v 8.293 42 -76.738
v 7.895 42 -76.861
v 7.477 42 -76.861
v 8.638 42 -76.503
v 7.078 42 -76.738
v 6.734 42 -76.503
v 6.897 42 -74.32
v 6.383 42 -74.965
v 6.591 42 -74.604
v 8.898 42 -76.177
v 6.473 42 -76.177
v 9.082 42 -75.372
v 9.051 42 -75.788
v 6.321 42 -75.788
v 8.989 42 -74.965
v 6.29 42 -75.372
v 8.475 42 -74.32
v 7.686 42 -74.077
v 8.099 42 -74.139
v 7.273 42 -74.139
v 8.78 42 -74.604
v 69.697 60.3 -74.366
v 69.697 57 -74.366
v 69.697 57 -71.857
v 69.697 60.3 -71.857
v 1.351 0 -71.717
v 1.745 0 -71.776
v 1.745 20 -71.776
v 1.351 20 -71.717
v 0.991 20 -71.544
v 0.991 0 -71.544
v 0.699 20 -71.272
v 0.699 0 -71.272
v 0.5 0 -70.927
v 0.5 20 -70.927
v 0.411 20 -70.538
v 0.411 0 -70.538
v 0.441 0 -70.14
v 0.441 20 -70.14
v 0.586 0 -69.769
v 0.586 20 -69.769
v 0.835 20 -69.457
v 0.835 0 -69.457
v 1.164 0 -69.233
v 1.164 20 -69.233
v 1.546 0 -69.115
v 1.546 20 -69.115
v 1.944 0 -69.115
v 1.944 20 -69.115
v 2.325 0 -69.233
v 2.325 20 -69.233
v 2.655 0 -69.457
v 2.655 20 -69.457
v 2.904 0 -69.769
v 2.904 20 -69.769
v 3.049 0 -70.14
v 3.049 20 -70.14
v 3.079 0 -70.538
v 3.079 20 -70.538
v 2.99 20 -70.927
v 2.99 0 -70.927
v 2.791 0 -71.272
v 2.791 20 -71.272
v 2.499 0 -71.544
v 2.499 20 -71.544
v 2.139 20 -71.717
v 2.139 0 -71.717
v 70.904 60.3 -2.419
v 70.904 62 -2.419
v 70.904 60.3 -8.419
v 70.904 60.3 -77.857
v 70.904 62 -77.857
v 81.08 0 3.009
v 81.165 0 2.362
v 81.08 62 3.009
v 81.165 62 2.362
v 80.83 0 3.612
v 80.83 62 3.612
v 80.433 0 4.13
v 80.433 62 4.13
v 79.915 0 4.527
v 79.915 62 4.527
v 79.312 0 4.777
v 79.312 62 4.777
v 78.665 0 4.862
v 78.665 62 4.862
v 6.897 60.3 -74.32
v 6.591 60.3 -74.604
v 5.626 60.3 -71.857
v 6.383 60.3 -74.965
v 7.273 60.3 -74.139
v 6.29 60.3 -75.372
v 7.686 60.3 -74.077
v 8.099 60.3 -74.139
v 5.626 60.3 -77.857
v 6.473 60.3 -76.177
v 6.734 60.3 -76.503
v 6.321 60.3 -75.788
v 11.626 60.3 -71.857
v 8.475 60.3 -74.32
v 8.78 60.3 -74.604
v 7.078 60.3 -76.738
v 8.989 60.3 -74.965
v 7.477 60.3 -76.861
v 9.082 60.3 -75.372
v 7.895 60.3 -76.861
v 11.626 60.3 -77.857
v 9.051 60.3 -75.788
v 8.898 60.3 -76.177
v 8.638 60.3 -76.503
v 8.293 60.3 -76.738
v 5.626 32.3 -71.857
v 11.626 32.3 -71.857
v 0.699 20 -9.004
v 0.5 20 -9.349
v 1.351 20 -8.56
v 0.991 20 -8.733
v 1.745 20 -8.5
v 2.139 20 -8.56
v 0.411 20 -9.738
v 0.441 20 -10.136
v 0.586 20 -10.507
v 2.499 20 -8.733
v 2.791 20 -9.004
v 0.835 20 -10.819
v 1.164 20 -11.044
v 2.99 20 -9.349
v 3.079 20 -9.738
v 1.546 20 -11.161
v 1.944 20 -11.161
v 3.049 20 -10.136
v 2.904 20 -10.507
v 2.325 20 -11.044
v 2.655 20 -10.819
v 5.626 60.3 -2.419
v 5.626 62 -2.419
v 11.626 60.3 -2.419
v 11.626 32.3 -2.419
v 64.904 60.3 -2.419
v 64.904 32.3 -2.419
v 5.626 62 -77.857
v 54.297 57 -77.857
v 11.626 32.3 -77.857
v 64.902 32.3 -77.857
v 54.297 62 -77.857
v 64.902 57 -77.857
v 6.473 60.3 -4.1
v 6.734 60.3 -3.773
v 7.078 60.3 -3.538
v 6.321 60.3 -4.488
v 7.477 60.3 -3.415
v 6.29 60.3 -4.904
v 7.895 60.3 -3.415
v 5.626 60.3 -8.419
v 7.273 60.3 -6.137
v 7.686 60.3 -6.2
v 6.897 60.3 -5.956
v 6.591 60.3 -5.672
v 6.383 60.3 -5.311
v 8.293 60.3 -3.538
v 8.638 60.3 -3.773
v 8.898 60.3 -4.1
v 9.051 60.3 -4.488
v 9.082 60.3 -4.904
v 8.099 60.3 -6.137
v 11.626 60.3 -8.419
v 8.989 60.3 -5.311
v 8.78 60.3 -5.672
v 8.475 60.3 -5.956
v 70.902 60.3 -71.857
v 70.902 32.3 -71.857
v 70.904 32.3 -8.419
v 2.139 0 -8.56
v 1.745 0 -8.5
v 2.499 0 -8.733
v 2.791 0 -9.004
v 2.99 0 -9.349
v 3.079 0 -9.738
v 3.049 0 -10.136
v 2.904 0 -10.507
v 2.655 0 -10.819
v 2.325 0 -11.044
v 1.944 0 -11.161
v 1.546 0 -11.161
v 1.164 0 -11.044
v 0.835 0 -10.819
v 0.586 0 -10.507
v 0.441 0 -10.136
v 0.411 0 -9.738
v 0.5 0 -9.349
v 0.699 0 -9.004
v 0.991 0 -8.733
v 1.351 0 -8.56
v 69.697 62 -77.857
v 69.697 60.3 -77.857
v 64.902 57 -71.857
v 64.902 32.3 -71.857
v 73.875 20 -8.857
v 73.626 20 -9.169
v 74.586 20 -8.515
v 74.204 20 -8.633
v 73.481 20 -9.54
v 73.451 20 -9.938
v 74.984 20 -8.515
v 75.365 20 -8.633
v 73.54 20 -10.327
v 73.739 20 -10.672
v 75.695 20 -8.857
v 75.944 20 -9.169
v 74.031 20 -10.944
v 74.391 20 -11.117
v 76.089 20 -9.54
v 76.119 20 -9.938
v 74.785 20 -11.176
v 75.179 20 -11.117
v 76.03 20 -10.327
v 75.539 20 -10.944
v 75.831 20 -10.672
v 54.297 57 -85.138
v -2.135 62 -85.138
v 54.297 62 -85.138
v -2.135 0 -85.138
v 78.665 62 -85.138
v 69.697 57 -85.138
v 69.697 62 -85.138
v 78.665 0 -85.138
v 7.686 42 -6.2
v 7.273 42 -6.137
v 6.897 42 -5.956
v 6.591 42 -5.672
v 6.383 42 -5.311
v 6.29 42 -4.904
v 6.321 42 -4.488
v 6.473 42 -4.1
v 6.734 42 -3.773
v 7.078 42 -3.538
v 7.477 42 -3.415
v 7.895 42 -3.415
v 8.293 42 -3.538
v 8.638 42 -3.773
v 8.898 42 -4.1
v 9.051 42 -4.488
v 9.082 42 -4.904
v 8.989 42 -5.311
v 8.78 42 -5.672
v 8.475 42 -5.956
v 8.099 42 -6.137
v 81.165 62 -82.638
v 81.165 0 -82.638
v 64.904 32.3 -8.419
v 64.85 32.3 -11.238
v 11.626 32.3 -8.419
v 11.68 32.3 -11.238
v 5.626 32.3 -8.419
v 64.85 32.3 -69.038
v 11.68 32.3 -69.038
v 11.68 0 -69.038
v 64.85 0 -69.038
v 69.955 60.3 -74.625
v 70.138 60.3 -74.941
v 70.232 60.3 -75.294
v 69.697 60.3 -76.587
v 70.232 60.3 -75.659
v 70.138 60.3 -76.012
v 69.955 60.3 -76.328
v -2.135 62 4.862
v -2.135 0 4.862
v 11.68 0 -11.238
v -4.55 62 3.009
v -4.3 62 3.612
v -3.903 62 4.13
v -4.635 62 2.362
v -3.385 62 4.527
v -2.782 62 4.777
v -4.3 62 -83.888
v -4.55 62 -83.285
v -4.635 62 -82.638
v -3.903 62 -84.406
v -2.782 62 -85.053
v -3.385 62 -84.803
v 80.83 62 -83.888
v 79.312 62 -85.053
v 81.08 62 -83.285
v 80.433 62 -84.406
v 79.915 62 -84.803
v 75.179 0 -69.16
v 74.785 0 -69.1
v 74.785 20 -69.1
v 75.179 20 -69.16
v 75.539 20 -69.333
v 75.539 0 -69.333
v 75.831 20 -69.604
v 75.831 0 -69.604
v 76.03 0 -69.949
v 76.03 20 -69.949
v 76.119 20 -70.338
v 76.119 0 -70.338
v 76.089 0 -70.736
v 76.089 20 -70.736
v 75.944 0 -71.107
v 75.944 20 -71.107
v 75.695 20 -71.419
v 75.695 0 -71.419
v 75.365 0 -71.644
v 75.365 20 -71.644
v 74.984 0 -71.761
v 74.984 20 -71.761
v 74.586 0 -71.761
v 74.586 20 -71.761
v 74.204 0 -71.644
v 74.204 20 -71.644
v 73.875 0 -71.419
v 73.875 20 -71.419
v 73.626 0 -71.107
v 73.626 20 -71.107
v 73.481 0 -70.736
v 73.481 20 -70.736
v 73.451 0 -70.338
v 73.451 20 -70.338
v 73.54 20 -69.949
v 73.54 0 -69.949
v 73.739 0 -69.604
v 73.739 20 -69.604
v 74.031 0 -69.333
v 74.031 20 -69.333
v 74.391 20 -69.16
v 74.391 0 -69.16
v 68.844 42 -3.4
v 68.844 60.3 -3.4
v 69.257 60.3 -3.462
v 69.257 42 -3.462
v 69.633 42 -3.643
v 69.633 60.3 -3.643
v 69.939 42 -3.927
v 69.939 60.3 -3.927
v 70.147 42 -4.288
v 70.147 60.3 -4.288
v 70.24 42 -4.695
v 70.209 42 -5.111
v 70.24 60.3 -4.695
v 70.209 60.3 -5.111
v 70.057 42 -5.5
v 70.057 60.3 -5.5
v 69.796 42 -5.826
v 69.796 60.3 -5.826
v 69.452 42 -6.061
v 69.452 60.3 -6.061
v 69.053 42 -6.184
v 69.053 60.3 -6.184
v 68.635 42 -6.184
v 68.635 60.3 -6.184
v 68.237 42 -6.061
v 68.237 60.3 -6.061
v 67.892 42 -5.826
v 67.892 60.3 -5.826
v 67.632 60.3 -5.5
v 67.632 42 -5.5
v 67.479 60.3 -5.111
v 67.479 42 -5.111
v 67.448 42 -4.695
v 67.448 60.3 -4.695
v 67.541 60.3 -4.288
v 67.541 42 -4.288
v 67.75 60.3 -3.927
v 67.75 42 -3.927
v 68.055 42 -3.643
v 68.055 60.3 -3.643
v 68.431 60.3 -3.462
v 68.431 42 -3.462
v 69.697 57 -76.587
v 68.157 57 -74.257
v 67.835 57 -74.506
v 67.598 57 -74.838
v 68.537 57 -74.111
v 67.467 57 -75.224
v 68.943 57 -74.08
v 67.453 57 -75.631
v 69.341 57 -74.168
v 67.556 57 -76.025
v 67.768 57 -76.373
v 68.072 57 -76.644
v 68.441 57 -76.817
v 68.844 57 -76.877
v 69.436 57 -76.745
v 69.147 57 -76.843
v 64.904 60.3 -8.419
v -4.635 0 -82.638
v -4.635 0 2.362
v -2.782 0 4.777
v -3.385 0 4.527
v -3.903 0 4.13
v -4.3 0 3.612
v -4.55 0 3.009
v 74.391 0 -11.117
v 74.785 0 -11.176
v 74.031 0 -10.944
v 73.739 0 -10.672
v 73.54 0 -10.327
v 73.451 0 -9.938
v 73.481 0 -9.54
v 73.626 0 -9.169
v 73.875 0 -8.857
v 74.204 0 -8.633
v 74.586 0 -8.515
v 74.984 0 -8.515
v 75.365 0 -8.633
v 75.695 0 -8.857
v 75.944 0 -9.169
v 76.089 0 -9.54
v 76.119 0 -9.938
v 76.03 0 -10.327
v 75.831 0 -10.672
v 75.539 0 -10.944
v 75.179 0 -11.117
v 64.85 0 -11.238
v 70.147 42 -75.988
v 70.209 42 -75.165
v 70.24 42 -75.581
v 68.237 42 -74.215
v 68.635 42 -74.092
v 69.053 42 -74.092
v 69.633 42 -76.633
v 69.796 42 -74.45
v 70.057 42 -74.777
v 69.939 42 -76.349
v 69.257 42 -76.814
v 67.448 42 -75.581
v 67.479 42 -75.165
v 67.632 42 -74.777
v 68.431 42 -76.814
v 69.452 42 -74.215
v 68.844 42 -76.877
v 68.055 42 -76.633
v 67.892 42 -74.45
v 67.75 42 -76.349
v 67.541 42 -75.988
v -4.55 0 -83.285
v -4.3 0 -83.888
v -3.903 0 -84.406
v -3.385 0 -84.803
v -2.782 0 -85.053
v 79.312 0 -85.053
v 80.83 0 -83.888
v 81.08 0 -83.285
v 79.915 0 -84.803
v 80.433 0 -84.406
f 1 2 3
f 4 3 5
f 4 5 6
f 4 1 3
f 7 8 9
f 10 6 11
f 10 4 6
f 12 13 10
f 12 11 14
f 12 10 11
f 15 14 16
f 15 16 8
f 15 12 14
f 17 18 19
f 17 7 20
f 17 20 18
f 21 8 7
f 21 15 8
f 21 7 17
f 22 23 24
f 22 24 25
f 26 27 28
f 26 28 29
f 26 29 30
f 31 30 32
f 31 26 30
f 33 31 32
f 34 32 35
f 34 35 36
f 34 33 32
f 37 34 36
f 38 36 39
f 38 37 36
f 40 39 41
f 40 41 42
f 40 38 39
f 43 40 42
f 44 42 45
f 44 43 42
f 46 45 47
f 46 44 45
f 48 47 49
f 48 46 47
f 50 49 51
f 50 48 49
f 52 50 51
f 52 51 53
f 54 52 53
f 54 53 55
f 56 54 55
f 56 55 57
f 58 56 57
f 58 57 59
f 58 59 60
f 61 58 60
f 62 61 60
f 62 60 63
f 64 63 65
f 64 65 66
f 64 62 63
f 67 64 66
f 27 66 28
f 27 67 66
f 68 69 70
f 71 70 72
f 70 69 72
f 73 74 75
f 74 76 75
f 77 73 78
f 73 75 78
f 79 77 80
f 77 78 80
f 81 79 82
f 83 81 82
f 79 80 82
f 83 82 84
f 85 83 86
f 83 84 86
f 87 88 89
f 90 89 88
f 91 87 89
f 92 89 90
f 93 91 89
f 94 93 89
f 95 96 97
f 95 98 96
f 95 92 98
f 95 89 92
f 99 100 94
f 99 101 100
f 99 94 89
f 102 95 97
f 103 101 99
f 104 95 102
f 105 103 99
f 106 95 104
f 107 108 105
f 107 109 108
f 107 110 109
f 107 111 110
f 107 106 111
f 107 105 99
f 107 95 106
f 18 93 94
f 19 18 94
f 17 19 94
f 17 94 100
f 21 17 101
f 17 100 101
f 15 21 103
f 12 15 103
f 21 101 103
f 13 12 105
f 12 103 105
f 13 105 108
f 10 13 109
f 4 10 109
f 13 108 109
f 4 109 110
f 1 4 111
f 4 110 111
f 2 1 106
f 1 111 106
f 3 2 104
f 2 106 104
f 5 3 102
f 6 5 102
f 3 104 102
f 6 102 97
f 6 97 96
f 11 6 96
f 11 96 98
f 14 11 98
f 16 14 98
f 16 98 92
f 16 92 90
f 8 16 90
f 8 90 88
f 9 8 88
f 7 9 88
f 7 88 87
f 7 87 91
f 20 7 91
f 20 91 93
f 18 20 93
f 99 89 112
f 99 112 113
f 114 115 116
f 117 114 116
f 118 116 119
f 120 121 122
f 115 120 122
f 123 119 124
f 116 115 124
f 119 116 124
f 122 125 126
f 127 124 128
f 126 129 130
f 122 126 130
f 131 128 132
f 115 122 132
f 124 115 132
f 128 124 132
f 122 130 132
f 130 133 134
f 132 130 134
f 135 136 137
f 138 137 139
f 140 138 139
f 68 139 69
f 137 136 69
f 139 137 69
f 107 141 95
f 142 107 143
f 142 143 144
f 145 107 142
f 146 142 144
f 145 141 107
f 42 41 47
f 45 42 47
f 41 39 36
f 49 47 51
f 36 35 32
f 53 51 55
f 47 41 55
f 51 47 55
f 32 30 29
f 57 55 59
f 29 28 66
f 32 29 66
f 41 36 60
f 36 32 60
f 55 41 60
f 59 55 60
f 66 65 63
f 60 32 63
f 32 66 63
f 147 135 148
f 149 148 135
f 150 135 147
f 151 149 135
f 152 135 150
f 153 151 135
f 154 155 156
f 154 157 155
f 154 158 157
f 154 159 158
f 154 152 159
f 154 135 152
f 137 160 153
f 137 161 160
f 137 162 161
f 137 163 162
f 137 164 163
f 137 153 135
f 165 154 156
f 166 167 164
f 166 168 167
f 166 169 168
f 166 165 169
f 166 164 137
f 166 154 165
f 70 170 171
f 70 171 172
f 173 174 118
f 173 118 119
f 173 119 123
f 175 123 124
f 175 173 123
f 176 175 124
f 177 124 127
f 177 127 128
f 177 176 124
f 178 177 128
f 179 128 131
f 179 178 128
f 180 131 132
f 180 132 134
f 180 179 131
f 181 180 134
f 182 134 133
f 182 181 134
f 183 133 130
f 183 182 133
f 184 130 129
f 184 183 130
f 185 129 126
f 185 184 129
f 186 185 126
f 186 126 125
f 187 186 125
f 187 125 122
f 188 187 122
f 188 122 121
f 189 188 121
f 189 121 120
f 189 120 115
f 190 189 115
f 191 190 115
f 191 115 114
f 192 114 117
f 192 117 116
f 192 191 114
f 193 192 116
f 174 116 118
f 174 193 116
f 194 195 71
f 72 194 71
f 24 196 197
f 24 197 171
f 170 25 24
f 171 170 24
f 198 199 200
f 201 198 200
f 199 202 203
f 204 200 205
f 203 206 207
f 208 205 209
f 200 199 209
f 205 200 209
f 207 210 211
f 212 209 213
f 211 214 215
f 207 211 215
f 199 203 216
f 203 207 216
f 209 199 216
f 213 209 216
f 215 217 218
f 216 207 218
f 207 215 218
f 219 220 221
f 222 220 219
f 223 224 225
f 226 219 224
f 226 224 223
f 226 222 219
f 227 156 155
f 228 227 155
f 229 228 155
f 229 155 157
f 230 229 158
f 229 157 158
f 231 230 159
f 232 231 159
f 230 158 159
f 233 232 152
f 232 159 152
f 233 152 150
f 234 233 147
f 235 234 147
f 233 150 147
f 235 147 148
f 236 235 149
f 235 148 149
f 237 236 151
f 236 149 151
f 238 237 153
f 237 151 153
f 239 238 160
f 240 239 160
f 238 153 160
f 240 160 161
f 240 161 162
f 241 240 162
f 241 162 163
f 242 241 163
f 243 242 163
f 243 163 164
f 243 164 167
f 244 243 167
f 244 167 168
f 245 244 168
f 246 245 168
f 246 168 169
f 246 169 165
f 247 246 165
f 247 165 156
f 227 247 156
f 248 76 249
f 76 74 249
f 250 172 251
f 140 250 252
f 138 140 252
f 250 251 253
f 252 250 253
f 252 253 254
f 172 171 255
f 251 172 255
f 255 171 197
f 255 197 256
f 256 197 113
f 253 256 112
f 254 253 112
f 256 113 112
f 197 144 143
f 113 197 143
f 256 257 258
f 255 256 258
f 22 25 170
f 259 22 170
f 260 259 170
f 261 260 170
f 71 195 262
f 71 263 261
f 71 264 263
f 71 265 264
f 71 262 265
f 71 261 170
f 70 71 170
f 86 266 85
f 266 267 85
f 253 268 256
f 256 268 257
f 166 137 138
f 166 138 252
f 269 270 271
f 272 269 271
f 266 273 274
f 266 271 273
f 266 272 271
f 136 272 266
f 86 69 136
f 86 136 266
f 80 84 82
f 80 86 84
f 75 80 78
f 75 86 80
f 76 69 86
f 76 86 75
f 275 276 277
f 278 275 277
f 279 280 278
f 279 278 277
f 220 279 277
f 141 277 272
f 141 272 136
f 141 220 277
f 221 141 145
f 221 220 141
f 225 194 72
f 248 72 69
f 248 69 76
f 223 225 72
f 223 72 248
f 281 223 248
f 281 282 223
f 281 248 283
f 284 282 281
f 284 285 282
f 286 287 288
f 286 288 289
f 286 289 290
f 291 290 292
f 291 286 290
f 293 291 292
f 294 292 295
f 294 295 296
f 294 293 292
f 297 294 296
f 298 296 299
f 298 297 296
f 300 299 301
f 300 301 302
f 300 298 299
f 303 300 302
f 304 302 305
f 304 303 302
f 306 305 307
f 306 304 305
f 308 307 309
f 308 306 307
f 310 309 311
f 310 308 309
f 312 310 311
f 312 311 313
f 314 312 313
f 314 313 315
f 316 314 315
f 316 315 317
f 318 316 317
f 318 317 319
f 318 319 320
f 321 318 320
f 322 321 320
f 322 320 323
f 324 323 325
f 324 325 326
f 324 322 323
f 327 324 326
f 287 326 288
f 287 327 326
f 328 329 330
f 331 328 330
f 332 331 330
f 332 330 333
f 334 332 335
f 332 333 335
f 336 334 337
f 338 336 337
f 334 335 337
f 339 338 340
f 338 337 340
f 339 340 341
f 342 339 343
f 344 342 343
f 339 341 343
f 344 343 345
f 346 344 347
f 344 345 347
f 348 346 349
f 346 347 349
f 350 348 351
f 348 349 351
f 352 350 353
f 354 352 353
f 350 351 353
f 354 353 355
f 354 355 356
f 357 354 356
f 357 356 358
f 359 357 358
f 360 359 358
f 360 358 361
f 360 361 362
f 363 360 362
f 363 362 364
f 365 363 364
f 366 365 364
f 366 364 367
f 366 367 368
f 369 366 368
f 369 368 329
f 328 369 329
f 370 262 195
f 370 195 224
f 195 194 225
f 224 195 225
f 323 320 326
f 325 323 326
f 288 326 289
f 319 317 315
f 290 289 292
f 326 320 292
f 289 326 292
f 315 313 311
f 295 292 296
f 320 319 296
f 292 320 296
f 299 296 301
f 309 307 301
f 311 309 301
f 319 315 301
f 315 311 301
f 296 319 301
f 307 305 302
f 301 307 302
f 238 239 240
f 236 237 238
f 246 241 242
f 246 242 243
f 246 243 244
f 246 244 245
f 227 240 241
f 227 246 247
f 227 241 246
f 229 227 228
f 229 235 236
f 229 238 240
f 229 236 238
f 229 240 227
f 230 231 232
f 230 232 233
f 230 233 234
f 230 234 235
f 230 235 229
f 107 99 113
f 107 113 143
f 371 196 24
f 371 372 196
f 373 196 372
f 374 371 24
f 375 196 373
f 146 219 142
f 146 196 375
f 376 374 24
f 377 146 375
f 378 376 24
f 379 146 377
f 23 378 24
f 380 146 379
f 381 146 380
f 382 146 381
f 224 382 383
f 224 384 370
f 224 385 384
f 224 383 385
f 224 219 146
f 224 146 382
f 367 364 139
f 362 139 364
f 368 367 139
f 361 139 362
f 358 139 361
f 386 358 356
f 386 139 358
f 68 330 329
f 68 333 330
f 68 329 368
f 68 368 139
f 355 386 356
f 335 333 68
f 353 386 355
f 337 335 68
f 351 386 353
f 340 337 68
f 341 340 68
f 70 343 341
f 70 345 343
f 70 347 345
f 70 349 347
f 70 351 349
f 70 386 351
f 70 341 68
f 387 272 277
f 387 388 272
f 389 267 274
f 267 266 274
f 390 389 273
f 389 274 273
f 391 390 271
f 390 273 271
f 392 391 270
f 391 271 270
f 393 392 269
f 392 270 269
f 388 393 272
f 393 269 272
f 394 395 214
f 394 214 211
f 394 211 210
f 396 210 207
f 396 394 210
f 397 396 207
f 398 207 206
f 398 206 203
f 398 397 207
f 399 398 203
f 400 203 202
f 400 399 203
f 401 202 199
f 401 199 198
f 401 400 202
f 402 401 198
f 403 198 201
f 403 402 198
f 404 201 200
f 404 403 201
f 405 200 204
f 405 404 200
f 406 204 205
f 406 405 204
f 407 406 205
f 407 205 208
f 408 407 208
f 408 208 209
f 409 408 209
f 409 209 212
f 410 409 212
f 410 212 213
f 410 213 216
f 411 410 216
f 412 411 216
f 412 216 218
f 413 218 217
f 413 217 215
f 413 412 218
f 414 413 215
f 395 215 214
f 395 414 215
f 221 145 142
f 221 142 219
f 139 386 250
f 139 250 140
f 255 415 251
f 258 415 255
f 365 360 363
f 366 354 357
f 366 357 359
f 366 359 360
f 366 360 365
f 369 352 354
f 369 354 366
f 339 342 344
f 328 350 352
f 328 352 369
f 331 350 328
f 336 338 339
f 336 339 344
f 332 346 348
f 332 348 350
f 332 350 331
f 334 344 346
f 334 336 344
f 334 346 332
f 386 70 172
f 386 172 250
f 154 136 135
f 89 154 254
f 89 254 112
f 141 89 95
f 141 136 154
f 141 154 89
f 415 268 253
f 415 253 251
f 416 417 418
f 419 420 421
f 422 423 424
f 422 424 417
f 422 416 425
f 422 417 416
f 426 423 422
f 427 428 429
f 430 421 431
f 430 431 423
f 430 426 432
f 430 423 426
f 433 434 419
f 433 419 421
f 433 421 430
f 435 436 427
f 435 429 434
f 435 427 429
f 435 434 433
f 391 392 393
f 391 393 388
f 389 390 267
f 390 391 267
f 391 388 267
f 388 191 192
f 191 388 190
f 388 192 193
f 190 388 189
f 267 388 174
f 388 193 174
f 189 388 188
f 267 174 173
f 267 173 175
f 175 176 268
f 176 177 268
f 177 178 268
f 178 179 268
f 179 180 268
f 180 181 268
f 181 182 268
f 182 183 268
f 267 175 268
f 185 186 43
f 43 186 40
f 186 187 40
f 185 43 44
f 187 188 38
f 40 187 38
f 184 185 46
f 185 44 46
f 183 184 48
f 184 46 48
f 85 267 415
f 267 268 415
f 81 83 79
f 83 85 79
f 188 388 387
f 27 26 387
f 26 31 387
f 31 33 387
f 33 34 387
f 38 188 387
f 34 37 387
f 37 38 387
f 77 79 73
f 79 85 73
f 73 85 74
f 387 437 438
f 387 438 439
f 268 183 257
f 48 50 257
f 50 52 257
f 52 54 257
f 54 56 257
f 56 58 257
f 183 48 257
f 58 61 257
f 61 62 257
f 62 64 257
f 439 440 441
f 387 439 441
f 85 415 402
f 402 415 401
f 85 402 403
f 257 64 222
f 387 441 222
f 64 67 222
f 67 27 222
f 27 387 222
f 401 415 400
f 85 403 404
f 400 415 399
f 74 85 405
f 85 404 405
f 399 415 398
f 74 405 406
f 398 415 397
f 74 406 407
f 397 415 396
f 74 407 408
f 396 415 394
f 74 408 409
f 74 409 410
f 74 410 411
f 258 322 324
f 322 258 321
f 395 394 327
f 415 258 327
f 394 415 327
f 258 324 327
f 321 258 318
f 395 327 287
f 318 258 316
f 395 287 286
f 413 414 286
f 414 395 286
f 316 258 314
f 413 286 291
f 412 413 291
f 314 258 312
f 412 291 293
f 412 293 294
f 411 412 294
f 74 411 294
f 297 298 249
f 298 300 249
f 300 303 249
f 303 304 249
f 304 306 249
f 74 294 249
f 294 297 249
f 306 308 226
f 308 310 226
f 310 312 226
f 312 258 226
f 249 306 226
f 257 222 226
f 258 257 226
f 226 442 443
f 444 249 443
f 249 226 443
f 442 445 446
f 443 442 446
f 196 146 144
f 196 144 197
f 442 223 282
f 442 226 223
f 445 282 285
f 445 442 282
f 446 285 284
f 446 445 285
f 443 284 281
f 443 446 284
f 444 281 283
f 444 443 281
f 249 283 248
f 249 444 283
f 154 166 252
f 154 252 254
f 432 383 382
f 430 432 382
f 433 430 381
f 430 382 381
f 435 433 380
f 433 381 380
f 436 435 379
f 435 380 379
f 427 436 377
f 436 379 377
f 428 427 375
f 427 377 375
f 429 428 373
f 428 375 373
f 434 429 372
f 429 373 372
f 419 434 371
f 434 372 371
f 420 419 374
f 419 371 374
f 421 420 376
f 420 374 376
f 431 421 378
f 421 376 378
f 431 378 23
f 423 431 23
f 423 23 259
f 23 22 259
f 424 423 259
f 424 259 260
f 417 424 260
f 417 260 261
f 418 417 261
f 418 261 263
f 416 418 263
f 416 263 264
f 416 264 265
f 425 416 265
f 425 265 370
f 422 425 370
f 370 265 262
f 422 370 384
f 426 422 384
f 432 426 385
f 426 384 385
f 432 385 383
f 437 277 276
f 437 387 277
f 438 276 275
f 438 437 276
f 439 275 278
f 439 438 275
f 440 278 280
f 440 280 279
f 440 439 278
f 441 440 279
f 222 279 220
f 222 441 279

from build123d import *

# Parameters (mm, degrees)
SKETCH_1_W          = 85.8
SKETCH_1_H          = 90
SKETCH_1_R          = 1.33793637
SKETCH_1_W_2        = 53.17
SKETCH_1_H_2        = 57.8
EXTRUDE_1_DEPTH     = 20
SKETCH_3_W          = 85.8
SKETCH_3_H          = 90
SKETCH_3_W_2        = 53.17
SKETCH_3_H_2        = 57.8
EXTRUDE_2_DEPTH     = 42
SKETCH_5_R          = 1.4
CUT_EXTRUDE_2_DEPTH = 20
SKETCH_5_6_W        = 65.278
SKETCH_5_6_H        = 75.438
CUT_EXTRUDE_3_DEPTH = 1.7
CUT_EXTRUDE_4_DEPTH = 28
SKETCH_8_W          = 15.4
SKETCH_8_H          = 7.281
CUT_EXTRUDE_5_DEPTH = 5
FILLET_1_R          = 2.5
FILLET_2_R          = 2.5
FILLET_3_R          = 2.5
FILLET_4_R          = 2.5
SKETCH_11_W         = 4.79539709
SKETCH_11_H         = 3.3
CUT_EXTRUDE_6_DEPTH = 10


with BuildPart() as part:
    # 草图1 → 凸台-拉伸1 (new body)
    with BuildSketch(Plane(origin=(0, 0, 0), x_dir=(1, 0, 0), z_dir=(0, 1, 0))):
        with Locations((38.264980184, 40.138091102)):
            Rectangle(SKETCH_1_W, SKETCH_1_H)
        with Locations((1.744980184, 9.838091102)):
            Circle(SKETCH_1_R, mode=Mode.SUBTRACT)
        with Locations((74.784980184, 9.838091102)):
            Circle(SKETCH_1_R, mode=Mode.SUBTRACT)
        with Locations((74.784980184, 70.438091102)):
            Circle(SKETCH_1_R, mode=Mode.SUBTRACT)
        with Locations((1.744980184, 70.438091102)):
            Circle(SKETCH_1_R, mode=Mode.SUBTRACT)
        with Locations((38.264980184, 40.138091102)):
            Rectangle(SKETCH_1_W_2, SKETCH_1_H_2, mode=Mode.SUBTRACT)
    extrude(amount=EXTRUDE_1_DEPTH)

    # 草图3 → 凸台-拉伸2 (add)
    with BuildSketch(Plane(origin=(0, 20, 0), x_dir=(1, 0, 0), z_dir=(0, 1, 0))):
        with Locations((38.264980184, 40.138091102)):
            Rectangle(SKETCH_3_W, SKETCH_3_H)
        with Locations((38.264980184, 40.138091102)):
            Rectangle(SKETCH_3_W_2, SKETCH_3_H_2, mode=Mode.SUBTRACT)
    extrude(amount=EXTRUDE_2_DEPTH)

    # 草图5 → 切除-拉伸2 (cut)
    with BuildSketch(Plane(origin=(0, 62, 0), x_dir=(1, 0, 0), z_dir=(0, 1, 0))):
        with Locations((7.68587004, 75.476595821)):
            Circle(SKETCH_5_R)
        with Locations((68.844090328, 75.476595821)):
            Circle(SKETCH_5_R)
        with Locations((68.844090328, 4.799586383)):
            Circle(SKETCH_5_R)
        with Locations((7.68587004, 4.799586383)):
            Circle(SKETCH_5_R)
    extrude(amount=-CUT_EXTRUDE_2_DEPTH, mode=Mode.SUBTRACT)

    # 草图5<6> → 切除-拉伸3 (cut)
    with BuildSketch(Plane(origin=(0, 62, 0), x_dir=(1, 0, 0), z_dir=(0, 1, 0))):
        with Locations((38.264980184, 40.138091102)):
            Rectangle(SKETCH_5_6_W, SKETCH_5_6_H)
    extrude(amount=-CUT_EXTRUDE_3_DEPTH, mode=Mode.SUBTRACT)

    # 草图7 → 切除-拉伸4 (cut)
    with BuildSketch(Plane(origin=(0, 60.3, 0), x_dir=(1, 0, 0), z_dir=(0, 1, 0))):
        Polygon((5.625980184, 71.857091102), (11.625980184, 71.857091102), (11.625980184, 77.857091102), (64.90160291, 77.857091102), (64.90160291, 71.857091102), (70.90160291, 71.857091102), (70.903980184, 8.419091102), (64.903980184, 8.419091102), (64.903980184, 2.419091102), (11.625980184, 2.419091102), (11.625980184, 8.419091102), (5.625980184, 8.419091102), align=None)
    extrude(amount=-CUT_EXTRUDE_4_DEPTH, mode=Mode.SUBTRACT)

    # 草图8 → 切除-拉伸5 (cut)
    with BuildSketch(Plane(origin=(0, 62, 0), x_dir=(1, 0, 0), z_dir=(0, 1, 0))):
        with Locations((61.997, 81.497591102)):
            Rectangle(SKETCH_8_W, SKETCH_8_H)
    extrude(amount=-CUT_EXTRUDE_5_DEPTH, mode=Mode.SUBTRACT)

    # 圆角1
    fillet_1_edges = [part.edges().sort_by_distance(p)[0] for p in [
        (-4.635019816, 31, -85.138091102),
    ]]
    fillet(fillet_1_edges, radius=FILLET_1_R)

    # 圆角2
    fillet_2_edges = [part.edges().sort_by_distance(p)[0] for p in [
        (81.164980184, 31, -85.138091102),
    ]]
    fillet(fillet_2_edges, radius=FILLET_2_R)

    # 圆角3
    fillet_3_edges = [part.edges().sort_by_distance(p)[0] for p in [
        (81.164980184, 31, 4.861908898),
    ]]
    fillet(fillet_3_edges, radius=FILLET_3_R)

    # 圆角4
    fillet_4_edges = [part.edges().sort_by_distance(p)[0] for p in [
        (-4.635019816, 31, 4.861908898),
    ]]
    fillet(fillet_4_edges, radius=FILLET_4_R)

    # 草图11 → 切除-拉伸6 (cut)
    with BuildSketch(Plane(origin=(0, 0, -77.857091102), x_dir=(-1, 0, 0), z_dir=(0, 0, -1))):
        with Locations((-67.299301455, 58.65)):
            Rectangle(SKETCH_11_W, SKETCH_11_H)
    extrude(amount=-CUT_EXTRUDE_6_DEPTH, mode=Mode.SUBTRACT)


solid = part.part
